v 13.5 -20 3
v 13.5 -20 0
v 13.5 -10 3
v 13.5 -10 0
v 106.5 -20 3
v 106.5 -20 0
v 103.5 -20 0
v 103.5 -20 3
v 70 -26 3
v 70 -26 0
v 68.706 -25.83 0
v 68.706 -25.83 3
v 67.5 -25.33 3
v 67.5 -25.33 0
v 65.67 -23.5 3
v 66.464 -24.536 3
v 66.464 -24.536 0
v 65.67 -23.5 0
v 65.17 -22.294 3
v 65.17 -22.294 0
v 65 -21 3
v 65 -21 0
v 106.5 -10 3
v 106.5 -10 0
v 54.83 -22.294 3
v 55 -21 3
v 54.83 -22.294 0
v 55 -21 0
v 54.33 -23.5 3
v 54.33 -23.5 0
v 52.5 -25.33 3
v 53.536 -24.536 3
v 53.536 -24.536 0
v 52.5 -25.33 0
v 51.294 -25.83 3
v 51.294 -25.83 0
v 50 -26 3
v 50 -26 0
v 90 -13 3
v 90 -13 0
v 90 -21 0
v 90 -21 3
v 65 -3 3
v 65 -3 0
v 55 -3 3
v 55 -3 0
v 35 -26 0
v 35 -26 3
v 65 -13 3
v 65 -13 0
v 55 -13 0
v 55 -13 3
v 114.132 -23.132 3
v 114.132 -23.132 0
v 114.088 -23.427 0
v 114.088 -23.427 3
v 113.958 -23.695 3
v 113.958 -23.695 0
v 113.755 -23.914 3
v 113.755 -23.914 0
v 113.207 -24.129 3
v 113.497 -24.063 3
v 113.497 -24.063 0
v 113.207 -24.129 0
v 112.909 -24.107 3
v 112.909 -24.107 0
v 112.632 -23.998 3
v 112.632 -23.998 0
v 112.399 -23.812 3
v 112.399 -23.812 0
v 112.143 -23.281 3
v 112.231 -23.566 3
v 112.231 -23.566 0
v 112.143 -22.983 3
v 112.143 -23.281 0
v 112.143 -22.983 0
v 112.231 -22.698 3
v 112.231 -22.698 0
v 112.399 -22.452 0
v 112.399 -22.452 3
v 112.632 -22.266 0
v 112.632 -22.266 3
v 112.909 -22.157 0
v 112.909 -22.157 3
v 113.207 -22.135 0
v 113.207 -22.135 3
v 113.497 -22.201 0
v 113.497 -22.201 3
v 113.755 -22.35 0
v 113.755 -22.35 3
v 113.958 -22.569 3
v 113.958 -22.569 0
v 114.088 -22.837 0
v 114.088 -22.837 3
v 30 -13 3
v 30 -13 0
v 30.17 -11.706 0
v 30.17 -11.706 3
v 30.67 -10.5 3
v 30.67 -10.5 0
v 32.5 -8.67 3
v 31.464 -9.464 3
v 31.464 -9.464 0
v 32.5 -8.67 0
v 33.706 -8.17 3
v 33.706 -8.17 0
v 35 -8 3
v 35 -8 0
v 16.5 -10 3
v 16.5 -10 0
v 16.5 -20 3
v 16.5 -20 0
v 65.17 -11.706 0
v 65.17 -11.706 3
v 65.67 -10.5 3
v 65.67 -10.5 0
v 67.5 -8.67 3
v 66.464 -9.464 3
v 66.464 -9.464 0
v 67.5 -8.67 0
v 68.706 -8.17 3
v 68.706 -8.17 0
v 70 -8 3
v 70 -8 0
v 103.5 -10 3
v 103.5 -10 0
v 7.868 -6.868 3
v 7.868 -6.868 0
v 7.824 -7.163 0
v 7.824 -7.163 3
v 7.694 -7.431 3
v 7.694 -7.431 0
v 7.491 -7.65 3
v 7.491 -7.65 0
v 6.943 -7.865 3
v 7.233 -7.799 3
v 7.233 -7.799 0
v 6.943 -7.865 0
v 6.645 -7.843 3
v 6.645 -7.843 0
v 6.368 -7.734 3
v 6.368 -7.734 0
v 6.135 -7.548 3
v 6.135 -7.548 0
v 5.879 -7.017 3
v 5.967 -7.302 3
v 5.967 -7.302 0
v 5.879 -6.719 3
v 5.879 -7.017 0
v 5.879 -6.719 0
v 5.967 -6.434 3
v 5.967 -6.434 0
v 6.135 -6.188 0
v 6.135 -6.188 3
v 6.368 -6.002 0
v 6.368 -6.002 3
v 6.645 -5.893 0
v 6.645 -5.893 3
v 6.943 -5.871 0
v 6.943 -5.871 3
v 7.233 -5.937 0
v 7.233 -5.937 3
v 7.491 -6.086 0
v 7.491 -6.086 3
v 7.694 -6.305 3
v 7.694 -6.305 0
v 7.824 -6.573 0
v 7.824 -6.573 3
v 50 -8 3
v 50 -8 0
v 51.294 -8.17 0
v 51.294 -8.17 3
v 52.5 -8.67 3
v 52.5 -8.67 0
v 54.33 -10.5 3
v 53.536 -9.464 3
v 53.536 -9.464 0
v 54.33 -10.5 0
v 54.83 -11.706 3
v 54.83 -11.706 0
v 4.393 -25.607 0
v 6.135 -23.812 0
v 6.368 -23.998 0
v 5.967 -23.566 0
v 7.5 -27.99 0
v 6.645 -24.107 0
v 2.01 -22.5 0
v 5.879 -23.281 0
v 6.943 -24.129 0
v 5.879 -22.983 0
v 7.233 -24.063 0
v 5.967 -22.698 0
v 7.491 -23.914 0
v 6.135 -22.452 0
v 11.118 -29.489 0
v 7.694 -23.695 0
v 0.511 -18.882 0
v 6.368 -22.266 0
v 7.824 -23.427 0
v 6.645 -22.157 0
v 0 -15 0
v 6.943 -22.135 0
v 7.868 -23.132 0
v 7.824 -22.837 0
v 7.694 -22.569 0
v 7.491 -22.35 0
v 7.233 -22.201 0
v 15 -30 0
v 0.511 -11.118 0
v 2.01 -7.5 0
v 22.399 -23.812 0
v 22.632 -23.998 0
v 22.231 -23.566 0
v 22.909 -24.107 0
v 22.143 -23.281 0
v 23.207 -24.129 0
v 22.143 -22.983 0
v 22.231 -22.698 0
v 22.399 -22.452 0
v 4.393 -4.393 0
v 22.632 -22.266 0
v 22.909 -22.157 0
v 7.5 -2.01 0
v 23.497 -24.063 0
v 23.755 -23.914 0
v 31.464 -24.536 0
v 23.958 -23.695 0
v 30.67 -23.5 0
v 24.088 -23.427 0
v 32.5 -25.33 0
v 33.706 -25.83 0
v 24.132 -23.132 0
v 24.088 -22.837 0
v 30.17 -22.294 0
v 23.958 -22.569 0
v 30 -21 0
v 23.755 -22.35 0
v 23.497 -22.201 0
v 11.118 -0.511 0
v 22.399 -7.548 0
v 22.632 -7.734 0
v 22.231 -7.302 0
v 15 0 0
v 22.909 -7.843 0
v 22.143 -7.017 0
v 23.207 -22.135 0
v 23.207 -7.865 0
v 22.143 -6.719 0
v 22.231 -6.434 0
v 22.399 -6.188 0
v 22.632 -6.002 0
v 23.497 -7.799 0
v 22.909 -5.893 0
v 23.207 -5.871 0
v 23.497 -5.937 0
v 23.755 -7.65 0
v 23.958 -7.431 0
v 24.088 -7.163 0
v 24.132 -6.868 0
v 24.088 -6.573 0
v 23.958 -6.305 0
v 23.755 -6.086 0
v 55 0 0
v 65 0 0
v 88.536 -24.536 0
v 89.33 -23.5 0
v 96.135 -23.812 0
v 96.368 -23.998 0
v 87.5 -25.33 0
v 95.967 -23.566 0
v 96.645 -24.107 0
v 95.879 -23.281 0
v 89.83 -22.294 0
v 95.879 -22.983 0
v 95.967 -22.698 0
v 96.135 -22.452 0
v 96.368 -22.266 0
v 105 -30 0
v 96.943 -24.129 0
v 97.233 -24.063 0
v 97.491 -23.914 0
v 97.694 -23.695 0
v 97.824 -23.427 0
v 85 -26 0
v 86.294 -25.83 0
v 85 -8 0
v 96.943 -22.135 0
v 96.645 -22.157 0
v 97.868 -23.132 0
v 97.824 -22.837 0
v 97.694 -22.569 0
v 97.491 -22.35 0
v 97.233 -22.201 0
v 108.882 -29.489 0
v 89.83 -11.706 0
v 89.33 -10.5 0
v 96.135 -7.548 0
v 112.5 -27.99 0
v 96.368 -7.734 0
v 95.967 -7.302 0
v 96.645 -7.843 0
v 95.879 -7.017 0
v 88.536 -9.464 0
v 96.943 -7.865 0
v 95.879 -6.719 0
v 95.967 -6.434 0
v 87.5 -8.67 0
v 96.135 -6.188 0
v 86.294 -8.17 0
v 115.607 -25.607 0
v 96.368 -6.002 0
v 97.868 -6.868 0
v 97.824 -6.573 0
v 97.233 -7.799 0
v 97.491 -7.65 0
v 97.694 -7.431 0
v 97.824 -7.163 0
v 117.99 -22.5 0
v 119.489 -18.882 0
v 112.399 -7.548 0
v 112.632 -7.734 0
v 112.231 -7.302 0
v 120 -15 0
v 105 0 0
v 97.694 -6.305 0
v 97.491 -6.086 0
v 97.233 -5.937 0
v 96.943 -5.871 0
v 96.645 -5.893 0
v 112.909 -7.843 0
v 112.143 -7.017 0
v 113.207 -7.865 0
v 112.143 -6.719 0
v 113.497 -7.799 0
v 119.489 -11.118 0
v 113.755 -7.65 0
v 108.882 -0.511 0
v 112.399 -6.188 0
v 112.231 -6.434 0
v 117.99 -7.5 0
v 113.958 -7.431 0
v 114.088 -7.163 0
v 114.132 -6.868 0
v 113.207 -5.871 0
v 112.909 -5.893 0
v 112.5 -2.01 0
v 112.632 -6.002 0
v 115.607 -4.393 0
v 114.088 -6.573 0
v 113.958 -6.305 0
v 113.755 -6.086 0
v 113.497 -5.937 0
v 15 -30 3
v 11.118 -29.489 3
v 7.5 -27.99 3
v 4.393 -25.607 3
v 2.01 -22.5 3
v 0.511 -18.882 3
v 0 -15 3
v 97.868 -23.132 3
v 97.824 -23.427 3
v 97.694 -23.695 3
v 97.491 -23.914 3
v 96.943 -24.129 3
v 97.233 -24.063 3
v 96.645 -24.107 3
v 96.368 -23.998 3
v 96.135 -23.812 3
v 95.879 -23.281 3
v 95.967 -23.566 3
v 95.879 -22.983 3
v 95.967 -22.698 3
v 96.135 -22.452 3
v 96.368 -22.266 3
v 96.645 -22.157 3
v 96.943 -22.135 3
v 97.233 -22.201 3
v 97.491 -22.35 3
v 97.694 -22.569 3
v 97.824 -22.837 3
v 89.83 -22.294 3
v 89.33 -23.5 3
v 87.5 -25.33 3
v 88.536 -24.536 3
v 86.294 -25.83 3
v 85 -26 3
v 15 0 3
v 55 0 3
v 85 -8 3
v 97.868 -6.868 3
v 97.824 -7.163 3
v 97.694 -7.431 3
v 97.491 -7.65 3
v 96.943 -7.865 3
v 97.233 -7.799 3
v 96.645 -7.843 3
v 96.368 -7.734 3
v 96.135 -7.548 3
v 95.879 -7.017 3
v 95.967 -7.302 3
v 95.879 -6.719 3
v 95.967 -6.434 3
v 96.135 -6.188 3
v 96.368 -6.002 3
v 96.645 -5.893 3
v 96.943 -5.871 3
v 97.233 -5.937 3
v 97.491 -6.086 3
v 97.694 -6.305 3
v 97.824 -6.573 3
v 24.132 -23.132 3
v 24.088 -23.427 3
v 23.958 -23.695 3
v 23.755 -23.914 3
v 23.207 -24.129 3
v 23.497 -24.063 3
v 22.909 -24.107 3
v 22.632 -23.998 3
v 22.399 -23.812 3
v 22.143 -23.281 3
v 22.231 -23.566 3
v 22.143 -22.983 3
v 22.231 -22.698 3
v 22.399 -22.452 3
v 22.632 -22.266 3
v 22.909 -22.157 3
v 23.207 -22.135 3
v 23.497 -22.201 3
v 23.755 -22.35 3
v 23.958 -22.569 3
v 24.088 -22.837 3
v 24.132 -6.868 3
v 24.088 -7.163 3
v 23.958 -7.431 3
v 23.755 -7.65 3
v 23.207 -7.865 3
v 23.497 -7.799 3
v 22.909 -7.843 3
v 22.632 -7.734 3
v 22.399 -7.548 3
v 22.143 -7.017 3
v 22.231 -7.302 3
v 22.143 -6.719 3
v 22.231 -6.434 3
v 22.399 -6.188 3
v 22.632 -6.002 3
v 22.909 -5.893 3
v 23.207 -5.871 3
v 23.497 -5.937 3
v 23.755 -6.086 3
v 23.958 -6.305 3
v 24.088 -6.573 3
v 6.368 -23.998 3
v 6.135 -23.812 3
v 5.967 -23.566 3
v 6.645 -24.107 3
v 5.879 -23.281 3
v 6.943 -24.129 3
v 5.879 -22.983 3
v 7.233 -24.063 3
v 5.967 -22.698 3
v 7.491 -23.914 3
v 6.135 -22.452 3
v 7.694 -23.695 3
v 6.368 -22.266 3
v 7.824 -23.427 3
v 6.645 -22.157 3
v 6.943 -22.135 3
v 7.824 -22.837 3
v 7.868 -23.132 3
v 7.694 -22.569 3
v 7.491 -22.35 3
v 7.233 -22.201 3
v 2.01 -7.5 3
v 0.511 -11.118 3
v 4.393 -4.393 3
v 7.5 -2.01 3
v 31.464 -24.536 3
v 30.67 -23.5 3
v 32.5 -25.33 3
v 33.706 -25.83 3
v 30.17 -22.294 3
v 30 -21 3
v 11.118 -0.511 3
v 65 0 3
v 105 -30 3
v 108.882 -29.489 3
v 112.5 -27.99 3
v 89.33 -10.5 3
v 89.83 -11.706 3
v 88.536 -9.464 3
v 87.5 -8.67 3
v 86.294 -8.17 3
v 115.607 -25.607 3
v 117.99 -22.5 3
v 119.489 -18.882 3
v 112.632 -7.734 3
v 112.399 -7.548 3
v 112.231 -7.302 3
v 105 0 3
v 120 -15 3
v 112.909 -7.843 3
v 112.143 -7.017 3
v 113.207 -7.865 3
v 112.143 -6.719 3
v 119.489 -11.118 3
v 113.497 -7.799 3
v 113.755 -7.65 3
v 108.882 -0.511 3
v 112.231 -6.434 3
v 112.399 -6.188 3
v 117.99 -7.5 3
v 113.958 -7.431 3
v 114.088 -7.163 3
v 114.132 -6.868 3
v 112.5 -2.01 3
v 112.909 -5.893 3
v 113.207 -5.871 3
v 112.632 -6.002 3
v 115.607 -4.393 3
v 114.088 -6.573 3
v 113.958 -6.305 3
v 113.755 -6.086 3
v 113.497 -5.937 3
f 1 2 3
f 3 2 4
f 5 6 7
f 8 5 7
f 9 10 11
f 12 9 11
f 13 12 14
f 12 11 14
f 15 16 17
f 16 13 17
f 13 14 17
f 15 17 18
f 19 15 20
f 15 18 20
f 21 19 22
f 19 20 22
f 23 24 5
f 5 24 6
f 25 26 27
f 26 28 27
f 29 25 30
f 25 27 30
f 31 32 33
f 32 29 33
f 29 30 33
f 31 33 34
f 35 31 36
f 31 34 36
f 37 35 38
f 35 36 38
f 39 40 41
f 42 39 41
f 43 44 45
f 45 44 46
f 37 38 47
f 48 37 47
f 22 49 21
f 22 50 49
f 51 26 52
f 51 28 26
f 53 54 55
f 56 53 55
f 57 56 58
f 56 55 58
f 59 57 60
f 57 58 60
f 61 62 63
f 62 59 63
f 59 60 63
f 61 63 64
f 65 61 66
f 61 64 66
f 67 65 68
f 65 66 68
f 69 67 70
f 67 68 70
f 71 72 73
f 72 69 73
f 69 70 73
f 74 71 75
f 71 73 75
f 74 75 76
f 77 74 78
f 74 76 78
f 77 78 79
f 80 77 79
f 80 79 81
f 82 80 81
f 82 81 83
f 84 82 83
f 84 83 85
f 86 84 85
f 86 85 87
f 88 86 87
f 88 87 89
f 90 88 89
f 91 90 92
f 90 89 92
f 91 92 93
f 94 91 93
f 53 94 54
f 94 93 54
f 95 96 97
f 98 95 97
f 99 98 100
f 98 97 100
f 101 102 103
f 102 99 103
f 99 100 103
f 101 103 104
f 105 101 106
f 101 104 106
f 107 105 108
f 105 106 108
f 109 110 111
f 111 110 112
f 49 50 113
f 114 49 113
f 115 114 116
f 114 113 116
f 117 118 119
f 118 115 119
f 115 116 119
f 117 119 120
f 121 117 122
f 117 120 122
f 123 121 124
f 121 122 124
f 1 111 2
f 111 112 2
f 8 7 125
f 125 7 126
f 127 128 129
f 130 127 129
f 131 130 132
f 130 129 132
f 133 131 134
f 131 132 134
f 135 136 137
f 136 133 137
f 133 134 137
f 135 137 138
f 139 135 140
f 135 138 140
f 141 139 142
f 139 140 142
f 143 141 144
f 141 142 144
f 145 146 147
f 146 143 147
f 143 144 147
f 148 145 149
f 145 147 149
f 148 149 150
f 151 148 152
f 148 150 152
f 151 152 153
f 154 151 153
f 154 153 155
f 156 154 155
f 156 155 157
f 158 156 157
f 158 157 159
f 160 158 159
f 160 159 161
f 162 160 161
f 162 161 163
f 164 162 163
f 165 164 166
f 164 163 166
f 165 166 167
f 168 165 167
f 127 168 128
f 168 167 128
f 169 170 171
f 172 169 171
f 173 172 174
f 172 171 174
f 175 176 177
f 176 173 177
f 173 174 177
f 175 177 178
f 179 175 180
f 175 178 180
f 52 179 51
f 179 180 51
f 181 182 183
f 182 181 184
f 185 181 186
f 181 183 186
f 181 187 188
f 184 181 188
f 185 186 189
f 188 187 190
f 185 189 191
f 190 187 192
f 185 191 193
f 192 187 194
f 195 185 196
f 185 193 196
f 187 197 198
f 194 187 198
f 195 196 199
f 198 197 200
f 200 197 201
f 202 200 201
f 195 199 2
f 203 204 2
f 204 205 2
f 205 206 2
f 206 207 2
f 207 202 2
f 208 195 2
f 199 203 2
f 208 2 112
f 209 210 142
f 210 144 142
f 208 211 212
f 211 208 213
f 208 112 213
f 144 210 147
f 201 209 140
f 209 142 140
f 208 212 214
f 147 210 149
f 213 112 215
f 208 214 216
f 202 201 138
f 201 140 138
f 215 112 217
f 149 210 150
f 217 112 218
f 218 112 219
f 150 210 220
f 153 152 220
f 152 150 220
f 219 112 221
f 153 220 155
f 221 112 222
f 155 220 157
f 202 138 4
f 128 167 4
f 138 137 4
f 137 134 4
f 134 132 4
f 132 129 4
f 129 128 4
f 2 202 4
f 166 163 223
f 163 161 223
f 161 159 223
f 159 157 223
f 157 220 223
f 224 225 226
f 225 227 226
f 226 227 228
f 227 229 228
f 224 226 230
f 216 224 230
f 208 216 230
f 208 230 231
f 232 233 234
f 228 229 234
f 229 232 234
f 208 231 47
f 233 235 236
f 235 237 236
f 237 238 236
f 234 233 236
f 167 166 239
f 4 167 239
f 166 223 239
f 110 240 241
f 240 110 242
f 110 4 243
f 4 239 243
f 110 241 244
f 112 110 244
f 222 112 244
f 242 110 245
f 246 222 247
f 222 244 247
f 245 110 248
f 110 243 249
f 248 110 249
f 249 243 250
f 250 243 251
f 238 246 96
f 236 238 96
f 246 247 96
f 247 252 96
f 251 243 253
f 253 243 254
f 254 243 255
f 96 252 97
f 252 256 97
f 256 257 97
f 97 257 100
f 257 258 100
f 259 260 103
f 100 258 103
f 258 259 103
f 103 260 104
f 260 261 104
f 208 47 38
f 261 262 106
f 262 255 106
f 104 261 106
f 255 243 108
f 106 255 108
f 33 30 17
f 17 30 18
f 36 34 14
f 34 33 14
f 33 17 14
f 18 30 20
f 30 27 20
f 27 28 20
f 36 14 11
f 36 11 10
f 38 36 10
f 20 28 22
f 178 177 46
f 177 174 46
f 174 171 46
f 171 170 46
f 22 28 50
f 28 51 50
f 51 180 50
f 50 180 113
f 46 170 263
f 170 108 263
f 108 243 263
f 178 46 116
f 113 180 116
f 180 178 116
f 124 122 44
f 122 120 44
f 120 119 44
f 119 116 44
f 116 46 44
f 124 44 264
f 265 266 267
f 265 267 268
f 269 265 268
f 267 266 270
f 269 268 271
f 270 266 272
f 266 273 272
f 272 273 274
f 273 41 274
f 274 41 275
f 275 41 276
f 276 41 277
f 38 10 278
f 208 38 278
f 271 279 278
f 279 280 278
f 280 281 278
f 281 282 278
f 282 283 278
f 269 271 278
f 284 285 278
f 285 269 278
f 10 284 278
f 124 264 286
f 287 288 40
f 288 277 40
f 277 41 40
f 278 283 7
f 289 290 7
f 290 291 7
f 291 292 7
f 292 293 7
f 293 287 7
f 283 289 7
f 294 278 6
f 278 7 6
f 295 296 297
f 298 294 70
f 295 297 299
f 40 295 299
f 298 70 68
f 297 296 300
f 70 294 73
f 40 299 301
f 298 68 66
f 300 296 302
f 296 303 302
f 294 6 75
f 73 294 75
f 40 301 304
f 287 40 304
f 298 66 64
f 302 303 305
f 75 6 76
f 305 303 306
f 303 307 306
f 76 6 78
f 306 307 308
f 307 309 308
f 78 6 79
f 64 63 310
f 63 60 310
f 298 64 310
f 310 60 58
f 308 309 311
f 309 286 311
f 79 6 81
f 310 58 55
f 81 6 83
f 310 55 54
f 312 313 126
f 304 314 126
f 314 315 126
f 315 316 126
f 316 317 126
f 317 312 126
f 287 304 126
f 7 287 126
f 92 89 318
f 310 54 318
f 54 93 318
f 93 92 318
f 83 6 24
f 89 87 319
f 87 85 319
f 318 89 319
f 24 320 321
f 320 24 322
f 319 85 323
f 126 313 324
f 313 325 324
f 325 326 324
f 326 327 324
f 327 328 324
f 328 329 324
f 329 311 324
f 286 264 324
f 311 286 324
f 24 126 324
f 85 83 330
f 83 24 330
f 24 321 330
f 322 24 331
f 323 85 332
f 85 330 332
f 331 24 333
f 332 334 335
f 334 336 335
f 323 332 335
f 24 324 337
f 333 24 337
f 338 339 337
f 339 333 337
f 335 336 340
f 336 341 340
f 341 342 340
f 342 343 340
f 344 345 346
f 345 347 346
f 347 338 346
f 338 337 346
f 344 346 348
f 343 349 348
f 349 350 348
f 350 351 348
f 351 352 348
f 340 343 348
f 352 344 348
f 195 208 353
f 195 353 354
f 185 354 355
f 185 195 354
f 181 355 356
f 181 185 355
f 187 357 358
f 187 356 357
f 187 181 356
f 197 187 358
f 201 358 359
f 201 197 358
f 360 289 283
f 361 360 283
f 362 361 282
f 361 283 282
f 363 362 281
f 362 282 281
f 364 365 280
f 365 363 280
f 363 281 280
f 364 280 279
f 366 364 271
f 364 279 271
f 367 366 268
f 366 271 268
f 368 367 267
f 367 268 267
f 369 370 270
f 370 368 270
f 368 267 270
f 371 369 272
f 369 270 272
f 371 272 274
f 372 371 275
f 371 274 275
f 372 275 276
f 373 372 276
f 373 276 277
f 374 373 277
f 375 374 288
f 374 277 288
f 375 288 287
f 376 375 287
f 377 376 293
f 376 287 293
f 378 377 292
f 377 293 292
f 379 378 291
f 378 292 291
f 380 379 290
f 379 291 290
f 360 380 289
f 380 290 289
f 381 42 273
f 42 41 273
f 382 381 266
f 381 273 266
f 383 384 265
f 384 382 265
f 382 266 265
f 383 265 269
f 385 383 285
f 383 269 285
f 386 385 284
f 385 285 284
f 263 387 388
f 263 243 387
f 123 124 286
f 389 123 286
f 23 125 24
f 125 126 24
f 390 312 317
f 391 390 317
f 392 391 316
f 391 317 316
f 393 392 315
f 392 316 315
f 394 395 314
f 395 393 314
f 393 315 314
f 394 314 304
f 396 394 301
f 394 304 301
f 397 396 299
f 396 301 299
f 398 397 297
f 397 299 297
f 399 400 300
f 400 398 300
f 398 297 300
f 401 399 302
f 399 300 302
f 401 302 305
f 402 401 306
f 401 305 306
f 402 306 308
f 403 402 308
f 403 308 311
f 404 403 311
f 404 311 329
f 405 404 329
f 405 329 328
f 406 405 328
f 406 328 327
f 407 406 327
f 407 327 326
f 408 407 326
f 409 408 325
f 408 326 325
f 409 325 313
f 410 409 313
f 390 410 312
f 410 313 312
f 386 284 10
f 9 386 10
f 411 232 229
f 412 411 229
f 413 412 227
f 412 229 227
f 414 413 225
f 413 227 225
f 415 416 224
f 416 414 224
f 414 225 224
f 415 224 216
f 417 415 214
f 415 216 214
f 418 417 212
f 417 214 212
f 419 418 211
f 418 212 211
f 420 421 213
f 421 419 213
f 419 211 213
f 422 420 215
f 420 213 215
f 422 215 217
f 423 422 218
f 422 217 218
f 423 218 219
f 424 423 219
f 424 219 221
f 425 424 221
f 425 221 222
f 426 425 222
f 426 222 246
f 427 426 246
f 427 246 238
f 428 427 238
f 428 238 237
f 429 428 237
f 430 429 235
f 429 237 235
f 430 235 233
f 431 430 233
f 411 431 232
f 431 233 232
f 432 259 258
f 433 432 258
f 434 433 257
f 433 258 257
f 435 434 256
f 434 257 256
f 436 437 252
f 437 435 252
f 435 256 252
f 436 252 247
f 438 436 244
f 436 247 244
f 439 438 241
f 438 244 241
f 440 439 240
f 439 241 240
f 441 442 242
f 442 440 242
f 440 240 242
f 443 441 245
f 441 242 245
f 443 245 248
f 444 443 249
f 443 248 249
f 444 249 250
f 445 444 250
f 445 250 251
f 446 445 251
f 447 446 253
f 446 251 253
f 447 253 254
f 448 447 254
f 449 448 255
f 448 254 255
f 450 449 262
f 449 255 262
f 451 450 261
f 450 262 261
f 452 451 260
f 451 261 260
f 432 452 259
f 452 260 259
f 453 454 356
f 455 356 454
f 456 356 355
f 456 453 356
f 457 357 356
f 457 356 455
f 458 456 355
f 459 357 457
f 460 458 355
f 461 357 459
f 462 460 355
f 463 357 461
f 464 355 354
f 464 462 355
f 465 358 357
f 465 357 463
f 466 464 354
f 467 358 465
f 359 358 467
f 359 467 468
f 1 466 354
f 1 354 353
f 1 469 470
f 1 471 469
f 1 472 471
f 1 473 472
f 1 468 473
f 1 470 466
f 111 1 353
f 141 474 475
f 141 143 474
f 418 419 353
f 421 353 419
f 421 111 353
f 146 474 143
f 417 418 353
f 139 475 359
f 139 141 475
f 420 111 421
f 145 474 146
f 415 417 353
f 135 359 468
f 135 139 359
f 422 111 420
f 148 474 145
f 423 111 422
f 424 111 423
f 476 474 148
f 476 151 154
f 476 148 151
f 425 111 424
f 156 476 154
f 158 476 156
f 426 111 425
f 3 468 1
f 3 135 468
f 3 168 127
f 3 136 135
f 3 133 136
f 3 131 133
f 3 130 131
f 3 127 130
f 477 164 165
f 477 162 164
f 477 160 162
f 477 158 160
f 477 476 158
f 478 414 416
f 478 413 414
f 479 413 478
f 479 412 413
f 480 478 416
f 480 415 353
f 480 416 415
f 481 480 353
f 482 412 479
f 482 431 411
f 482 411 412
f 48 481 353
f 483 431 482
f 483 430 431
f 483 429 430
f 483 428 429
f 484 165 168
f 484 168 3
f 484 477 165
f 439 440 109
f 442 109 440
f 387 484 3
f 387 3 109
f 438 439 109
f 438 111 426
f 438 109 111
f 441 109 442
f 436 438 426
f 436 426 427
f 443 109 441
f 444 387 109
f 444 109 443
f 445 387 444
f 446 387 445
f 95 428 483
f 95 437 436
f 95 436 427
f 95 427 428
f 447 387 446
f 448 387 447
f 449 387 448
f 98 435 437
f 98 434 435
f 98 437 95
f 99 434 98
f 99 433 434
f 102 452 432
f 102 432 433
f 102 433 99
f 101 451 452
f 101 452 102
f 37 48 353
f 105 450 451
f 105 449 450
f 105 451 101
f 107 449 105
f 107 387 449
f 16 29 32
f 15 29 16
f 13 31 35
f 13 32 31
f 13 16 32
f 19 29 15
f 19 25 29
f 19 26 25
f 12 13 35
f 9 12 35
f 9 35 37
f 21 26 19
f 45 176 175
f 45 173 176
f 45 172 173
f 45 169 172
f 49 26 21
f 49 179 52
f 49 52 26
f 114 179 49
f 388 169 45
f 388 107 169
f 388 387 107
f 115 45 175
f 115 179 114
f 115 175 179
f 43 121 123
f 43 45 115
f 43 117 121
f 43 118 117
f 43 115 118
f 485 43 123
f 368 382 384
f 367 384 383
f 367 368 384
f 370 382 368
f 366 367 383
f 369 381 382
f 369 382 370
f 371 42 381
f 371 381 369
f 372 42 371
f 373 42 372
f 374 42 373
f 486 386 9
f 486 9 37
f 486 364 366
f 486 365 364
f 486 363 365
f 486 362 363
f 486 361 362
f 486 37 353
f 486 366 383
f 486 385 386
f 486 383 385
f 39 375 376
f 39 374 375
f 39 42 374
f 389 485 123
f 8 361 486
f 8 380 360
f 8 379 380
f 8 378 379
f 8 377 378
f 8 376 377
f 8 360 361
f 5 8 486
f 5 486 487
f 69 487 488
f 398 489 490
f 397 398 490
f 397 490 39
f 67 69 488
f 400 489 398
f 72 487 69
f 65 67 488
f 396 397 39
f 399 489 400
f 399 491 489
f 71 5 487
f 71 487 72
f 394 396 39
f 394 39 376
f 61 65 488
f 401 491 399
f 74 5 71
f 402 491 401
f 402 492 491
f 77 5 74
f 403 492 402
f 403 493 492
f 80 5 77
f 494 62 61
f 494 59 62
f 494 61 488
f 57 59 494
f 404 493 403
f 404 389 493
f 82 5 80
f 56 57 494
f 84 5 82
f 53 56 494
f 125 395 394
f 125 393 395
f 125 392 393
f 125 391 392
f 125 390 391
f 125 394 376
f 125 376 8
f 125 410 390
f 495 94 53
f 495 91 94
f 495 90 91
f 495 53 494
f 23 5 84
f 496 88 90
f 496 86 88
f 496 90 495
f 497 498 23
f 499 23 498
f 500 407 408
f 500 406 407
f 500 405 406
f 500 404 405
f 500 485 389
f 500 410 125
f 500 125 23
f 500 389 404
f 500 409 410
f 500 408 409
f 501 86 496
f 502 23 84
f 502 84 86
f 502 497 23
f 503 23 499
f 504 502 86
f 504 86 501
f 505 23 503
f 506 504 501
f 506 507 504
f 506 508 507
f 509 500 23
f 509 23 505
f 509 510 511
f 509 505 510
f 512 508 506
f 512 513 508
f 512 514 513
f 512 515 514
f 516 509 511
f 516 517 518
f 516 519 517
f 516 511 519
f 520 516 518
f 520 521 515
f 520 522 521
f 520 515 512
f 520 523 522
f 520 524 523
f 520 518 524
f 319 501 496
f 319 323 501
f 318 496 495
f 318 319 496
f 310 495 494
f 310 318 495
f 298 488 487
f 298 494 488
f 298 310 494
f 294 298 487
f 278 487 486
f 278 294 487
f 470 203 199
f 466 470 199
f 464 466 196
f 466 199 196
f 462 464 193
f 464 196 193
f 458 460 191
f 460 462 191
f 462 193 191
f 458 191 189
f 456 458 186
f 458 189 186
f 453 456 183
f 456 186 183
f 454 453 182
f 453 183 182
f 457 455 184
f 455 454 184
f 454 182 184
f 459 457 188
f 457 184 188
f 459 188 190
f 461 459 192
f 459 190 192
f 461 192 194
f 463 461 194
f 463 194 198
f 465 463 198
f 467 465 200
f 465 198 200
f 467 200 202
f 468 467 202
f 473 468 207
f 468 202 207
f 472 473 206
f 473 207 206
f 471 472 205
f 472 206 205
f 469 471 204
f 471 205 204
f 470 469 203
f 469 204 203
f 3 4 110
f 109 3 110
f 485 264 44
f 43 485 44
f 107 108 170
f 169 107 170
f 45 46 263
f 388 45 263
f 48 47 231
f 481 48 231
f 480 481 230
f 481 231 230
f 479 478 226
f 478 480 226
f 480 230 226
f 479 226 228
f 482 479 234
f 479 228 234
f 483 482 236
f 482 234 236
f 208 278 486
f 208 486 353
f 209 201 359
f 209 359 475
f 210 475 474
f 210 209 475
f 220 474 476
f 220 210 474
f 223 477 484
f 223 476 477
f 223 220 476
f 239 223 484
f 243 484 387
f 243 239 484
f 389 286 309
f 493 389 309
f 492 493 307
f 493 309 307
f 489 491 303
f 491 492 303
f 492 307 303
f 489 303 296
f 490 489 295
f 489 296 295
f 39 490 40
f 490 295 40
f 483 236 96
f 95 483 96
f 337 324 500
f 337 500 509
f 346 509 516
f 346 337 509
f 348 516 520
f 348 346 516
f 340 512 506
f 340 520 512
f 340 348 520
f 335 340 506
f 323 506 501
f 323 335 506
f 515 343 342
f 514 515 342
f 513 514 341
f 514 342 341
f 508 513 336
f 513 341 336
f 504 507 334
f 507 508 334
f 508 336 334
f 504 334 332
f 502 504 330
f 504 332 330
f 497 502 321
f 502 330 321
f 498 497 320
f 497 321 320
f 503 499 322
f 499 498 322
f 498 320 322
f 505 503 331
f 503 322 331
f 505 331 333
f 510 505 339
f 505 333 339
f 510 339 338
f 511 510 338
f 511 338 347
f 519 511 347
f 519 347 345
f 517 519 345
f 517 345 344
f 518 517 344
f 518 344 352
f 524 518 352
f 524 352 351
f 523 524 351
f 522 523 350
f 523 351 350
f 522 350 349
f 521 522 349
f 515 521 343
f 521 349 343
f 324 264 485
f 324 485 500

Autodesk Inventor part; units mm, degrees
ref_plane "YZ Plane" through (0, 0, 0) normal (1, 0, 0) x (0, 1, 0)
ref_plane "XZ Plane" through (0, 0, 0) normal (0, 1, 0) x (-1, 0, 0)
ref_plane "XY Plane" through (0, 0, 0) normal (0, 0, 1) x (1, 0, 0)
sketch "Sketch1" plane through (0, 0, 0) normal (0, 0, 1) x (1, 0, 0)
  line L0 (120, -15) -> (120, -15)
  line L1 (105, -30) -> (15, -30)
  line L2 (0, -15) -> (0, -15)
  line L3 (13.5, -10) -> (16.5, -10)
  line L4 (16.5, -10) -> (16.5, -20)
  line L5 (16.5, -20) -> (13.5, -20)
  line L6 (13.5, -20) -> (13.5, -10)
  line L7 (103.5, -10) -> (106.5, -10)
  line L8 (106.5, -10) -> (106.5, -20)
  line L9 (106.5, -20) -> (103.5, -20)
  line L10 (103.5, -20) -> (103.5, -10)
  arc A0 (15, 0) -> (0, -15) centre (15, -15) ccw
  arc A1 (0, -15) -> (15, -30) centre (15, -15) ccw
  arc A2 (105, -30) -> (120, -15) centre (105, -15) ccw
  arc A3 (120, -15) -> (105, 0) centre (105, -15) ccw
  line L11 (65, 0) -> (65, -3)
  line L12 (65, -3) -> (55, -3)
  line L13 (55, -3) -> (55, 0)
  line L14 (15, 0) -> (55, 0)
  line L15 (65, 0) -> (105, 0)
  line L16 (90, -13) -> (90, -21)
  line L17 (30, -21) -> (30, -13)
  arc A4 (35, -8) -> (30, -13) centre (35, -13) ccw
  arc A5 (90, -13) -> (85, -8) centre (85, -13) ccw
  arc A6 (85, -26) -> (90, -21) centre (85, -21) ccw
  arc A7 (30, -21) -> (35, -26) centre (35, -21) ccw
  line L18 (65, -13) -> (65, -21)
  line L19 (55, -21) -> (55, -13)
  line L20 (35, -8) -> (50, -8)
  line L21 (70, -8) -> (85, -8)
  line L22 (85, -26) -> (70, -26)
  line L23 (50, -26) -> (35, -26)
  arc A8 (55, -13) -> (50, -8) centre (50, -13) ccw
  arc A9 (50, -26) -> (55, -21) centre (50, -21) ccw
  arc A10 (65, -21) -> (70, -26) centre (70, -21) ccw
  arc A11 (70, -8) -> (65, -13) centre (70, -13) ccw
  circle A12 centre (6.868, -6.868) radius 1
  circle A13 centre (6.868, -23.132) radius 1
  circle A14 centre (23.132, -23.132) radius 1
  circle A15 centre (23.132, -6.868) radius 1
  circle A16 centre (113.132, -6.868) radius 1
  circle A17 centre (96.868, -6.868) radius 1
  circle A18 centre (96.868, -23.132) radius 1
  circle A19 centre (113.132, -23.132) radius 1
  point P0 (0, 0)
  point P1 (120, 0)
  point P2 (0, -30)
  dimension "d0" = 30
  dimension "d1" = 120
  dimension "d2" = 10
  dimension "d3" = 3
  dimension "d4" = 13.5
  dimension "d5" = 10
  dimension "d6" = 87
  dimension "d7" = 3
  dimension "d8" = 10
  dimension "d9" = 10
  dimension "d10" = 15
  dimension "d11" = 10
  dimension "d12" = 55
  dimension "d13" = 3
  dimension "d18" = 30
  dimension "d19" = 30
  dimension "d20" = 5
  dimension "d23" = 25
  dimension "d24" = 25
  dimension "d25" = 5
  dimension "d27" = 8
  dimension "d30" = 2
  dimension "d31" = 8.132
  dimension "d32" = 8.132
  dimension "d35" = 360
  dimension "d37" = 2
  dimension "d40" = 8.132
  dimension "d41" = 8.132
  dimension "d44" = 360
  dimension "d48" = 18
  dimension "d50" = 3
  dimension "d51" = 15
extrude "Extrusion4" add sketch "Sketch1" along normal blind 3
properties part number "OpenROV 2_3 Dev Horizontal Motor Mount"
